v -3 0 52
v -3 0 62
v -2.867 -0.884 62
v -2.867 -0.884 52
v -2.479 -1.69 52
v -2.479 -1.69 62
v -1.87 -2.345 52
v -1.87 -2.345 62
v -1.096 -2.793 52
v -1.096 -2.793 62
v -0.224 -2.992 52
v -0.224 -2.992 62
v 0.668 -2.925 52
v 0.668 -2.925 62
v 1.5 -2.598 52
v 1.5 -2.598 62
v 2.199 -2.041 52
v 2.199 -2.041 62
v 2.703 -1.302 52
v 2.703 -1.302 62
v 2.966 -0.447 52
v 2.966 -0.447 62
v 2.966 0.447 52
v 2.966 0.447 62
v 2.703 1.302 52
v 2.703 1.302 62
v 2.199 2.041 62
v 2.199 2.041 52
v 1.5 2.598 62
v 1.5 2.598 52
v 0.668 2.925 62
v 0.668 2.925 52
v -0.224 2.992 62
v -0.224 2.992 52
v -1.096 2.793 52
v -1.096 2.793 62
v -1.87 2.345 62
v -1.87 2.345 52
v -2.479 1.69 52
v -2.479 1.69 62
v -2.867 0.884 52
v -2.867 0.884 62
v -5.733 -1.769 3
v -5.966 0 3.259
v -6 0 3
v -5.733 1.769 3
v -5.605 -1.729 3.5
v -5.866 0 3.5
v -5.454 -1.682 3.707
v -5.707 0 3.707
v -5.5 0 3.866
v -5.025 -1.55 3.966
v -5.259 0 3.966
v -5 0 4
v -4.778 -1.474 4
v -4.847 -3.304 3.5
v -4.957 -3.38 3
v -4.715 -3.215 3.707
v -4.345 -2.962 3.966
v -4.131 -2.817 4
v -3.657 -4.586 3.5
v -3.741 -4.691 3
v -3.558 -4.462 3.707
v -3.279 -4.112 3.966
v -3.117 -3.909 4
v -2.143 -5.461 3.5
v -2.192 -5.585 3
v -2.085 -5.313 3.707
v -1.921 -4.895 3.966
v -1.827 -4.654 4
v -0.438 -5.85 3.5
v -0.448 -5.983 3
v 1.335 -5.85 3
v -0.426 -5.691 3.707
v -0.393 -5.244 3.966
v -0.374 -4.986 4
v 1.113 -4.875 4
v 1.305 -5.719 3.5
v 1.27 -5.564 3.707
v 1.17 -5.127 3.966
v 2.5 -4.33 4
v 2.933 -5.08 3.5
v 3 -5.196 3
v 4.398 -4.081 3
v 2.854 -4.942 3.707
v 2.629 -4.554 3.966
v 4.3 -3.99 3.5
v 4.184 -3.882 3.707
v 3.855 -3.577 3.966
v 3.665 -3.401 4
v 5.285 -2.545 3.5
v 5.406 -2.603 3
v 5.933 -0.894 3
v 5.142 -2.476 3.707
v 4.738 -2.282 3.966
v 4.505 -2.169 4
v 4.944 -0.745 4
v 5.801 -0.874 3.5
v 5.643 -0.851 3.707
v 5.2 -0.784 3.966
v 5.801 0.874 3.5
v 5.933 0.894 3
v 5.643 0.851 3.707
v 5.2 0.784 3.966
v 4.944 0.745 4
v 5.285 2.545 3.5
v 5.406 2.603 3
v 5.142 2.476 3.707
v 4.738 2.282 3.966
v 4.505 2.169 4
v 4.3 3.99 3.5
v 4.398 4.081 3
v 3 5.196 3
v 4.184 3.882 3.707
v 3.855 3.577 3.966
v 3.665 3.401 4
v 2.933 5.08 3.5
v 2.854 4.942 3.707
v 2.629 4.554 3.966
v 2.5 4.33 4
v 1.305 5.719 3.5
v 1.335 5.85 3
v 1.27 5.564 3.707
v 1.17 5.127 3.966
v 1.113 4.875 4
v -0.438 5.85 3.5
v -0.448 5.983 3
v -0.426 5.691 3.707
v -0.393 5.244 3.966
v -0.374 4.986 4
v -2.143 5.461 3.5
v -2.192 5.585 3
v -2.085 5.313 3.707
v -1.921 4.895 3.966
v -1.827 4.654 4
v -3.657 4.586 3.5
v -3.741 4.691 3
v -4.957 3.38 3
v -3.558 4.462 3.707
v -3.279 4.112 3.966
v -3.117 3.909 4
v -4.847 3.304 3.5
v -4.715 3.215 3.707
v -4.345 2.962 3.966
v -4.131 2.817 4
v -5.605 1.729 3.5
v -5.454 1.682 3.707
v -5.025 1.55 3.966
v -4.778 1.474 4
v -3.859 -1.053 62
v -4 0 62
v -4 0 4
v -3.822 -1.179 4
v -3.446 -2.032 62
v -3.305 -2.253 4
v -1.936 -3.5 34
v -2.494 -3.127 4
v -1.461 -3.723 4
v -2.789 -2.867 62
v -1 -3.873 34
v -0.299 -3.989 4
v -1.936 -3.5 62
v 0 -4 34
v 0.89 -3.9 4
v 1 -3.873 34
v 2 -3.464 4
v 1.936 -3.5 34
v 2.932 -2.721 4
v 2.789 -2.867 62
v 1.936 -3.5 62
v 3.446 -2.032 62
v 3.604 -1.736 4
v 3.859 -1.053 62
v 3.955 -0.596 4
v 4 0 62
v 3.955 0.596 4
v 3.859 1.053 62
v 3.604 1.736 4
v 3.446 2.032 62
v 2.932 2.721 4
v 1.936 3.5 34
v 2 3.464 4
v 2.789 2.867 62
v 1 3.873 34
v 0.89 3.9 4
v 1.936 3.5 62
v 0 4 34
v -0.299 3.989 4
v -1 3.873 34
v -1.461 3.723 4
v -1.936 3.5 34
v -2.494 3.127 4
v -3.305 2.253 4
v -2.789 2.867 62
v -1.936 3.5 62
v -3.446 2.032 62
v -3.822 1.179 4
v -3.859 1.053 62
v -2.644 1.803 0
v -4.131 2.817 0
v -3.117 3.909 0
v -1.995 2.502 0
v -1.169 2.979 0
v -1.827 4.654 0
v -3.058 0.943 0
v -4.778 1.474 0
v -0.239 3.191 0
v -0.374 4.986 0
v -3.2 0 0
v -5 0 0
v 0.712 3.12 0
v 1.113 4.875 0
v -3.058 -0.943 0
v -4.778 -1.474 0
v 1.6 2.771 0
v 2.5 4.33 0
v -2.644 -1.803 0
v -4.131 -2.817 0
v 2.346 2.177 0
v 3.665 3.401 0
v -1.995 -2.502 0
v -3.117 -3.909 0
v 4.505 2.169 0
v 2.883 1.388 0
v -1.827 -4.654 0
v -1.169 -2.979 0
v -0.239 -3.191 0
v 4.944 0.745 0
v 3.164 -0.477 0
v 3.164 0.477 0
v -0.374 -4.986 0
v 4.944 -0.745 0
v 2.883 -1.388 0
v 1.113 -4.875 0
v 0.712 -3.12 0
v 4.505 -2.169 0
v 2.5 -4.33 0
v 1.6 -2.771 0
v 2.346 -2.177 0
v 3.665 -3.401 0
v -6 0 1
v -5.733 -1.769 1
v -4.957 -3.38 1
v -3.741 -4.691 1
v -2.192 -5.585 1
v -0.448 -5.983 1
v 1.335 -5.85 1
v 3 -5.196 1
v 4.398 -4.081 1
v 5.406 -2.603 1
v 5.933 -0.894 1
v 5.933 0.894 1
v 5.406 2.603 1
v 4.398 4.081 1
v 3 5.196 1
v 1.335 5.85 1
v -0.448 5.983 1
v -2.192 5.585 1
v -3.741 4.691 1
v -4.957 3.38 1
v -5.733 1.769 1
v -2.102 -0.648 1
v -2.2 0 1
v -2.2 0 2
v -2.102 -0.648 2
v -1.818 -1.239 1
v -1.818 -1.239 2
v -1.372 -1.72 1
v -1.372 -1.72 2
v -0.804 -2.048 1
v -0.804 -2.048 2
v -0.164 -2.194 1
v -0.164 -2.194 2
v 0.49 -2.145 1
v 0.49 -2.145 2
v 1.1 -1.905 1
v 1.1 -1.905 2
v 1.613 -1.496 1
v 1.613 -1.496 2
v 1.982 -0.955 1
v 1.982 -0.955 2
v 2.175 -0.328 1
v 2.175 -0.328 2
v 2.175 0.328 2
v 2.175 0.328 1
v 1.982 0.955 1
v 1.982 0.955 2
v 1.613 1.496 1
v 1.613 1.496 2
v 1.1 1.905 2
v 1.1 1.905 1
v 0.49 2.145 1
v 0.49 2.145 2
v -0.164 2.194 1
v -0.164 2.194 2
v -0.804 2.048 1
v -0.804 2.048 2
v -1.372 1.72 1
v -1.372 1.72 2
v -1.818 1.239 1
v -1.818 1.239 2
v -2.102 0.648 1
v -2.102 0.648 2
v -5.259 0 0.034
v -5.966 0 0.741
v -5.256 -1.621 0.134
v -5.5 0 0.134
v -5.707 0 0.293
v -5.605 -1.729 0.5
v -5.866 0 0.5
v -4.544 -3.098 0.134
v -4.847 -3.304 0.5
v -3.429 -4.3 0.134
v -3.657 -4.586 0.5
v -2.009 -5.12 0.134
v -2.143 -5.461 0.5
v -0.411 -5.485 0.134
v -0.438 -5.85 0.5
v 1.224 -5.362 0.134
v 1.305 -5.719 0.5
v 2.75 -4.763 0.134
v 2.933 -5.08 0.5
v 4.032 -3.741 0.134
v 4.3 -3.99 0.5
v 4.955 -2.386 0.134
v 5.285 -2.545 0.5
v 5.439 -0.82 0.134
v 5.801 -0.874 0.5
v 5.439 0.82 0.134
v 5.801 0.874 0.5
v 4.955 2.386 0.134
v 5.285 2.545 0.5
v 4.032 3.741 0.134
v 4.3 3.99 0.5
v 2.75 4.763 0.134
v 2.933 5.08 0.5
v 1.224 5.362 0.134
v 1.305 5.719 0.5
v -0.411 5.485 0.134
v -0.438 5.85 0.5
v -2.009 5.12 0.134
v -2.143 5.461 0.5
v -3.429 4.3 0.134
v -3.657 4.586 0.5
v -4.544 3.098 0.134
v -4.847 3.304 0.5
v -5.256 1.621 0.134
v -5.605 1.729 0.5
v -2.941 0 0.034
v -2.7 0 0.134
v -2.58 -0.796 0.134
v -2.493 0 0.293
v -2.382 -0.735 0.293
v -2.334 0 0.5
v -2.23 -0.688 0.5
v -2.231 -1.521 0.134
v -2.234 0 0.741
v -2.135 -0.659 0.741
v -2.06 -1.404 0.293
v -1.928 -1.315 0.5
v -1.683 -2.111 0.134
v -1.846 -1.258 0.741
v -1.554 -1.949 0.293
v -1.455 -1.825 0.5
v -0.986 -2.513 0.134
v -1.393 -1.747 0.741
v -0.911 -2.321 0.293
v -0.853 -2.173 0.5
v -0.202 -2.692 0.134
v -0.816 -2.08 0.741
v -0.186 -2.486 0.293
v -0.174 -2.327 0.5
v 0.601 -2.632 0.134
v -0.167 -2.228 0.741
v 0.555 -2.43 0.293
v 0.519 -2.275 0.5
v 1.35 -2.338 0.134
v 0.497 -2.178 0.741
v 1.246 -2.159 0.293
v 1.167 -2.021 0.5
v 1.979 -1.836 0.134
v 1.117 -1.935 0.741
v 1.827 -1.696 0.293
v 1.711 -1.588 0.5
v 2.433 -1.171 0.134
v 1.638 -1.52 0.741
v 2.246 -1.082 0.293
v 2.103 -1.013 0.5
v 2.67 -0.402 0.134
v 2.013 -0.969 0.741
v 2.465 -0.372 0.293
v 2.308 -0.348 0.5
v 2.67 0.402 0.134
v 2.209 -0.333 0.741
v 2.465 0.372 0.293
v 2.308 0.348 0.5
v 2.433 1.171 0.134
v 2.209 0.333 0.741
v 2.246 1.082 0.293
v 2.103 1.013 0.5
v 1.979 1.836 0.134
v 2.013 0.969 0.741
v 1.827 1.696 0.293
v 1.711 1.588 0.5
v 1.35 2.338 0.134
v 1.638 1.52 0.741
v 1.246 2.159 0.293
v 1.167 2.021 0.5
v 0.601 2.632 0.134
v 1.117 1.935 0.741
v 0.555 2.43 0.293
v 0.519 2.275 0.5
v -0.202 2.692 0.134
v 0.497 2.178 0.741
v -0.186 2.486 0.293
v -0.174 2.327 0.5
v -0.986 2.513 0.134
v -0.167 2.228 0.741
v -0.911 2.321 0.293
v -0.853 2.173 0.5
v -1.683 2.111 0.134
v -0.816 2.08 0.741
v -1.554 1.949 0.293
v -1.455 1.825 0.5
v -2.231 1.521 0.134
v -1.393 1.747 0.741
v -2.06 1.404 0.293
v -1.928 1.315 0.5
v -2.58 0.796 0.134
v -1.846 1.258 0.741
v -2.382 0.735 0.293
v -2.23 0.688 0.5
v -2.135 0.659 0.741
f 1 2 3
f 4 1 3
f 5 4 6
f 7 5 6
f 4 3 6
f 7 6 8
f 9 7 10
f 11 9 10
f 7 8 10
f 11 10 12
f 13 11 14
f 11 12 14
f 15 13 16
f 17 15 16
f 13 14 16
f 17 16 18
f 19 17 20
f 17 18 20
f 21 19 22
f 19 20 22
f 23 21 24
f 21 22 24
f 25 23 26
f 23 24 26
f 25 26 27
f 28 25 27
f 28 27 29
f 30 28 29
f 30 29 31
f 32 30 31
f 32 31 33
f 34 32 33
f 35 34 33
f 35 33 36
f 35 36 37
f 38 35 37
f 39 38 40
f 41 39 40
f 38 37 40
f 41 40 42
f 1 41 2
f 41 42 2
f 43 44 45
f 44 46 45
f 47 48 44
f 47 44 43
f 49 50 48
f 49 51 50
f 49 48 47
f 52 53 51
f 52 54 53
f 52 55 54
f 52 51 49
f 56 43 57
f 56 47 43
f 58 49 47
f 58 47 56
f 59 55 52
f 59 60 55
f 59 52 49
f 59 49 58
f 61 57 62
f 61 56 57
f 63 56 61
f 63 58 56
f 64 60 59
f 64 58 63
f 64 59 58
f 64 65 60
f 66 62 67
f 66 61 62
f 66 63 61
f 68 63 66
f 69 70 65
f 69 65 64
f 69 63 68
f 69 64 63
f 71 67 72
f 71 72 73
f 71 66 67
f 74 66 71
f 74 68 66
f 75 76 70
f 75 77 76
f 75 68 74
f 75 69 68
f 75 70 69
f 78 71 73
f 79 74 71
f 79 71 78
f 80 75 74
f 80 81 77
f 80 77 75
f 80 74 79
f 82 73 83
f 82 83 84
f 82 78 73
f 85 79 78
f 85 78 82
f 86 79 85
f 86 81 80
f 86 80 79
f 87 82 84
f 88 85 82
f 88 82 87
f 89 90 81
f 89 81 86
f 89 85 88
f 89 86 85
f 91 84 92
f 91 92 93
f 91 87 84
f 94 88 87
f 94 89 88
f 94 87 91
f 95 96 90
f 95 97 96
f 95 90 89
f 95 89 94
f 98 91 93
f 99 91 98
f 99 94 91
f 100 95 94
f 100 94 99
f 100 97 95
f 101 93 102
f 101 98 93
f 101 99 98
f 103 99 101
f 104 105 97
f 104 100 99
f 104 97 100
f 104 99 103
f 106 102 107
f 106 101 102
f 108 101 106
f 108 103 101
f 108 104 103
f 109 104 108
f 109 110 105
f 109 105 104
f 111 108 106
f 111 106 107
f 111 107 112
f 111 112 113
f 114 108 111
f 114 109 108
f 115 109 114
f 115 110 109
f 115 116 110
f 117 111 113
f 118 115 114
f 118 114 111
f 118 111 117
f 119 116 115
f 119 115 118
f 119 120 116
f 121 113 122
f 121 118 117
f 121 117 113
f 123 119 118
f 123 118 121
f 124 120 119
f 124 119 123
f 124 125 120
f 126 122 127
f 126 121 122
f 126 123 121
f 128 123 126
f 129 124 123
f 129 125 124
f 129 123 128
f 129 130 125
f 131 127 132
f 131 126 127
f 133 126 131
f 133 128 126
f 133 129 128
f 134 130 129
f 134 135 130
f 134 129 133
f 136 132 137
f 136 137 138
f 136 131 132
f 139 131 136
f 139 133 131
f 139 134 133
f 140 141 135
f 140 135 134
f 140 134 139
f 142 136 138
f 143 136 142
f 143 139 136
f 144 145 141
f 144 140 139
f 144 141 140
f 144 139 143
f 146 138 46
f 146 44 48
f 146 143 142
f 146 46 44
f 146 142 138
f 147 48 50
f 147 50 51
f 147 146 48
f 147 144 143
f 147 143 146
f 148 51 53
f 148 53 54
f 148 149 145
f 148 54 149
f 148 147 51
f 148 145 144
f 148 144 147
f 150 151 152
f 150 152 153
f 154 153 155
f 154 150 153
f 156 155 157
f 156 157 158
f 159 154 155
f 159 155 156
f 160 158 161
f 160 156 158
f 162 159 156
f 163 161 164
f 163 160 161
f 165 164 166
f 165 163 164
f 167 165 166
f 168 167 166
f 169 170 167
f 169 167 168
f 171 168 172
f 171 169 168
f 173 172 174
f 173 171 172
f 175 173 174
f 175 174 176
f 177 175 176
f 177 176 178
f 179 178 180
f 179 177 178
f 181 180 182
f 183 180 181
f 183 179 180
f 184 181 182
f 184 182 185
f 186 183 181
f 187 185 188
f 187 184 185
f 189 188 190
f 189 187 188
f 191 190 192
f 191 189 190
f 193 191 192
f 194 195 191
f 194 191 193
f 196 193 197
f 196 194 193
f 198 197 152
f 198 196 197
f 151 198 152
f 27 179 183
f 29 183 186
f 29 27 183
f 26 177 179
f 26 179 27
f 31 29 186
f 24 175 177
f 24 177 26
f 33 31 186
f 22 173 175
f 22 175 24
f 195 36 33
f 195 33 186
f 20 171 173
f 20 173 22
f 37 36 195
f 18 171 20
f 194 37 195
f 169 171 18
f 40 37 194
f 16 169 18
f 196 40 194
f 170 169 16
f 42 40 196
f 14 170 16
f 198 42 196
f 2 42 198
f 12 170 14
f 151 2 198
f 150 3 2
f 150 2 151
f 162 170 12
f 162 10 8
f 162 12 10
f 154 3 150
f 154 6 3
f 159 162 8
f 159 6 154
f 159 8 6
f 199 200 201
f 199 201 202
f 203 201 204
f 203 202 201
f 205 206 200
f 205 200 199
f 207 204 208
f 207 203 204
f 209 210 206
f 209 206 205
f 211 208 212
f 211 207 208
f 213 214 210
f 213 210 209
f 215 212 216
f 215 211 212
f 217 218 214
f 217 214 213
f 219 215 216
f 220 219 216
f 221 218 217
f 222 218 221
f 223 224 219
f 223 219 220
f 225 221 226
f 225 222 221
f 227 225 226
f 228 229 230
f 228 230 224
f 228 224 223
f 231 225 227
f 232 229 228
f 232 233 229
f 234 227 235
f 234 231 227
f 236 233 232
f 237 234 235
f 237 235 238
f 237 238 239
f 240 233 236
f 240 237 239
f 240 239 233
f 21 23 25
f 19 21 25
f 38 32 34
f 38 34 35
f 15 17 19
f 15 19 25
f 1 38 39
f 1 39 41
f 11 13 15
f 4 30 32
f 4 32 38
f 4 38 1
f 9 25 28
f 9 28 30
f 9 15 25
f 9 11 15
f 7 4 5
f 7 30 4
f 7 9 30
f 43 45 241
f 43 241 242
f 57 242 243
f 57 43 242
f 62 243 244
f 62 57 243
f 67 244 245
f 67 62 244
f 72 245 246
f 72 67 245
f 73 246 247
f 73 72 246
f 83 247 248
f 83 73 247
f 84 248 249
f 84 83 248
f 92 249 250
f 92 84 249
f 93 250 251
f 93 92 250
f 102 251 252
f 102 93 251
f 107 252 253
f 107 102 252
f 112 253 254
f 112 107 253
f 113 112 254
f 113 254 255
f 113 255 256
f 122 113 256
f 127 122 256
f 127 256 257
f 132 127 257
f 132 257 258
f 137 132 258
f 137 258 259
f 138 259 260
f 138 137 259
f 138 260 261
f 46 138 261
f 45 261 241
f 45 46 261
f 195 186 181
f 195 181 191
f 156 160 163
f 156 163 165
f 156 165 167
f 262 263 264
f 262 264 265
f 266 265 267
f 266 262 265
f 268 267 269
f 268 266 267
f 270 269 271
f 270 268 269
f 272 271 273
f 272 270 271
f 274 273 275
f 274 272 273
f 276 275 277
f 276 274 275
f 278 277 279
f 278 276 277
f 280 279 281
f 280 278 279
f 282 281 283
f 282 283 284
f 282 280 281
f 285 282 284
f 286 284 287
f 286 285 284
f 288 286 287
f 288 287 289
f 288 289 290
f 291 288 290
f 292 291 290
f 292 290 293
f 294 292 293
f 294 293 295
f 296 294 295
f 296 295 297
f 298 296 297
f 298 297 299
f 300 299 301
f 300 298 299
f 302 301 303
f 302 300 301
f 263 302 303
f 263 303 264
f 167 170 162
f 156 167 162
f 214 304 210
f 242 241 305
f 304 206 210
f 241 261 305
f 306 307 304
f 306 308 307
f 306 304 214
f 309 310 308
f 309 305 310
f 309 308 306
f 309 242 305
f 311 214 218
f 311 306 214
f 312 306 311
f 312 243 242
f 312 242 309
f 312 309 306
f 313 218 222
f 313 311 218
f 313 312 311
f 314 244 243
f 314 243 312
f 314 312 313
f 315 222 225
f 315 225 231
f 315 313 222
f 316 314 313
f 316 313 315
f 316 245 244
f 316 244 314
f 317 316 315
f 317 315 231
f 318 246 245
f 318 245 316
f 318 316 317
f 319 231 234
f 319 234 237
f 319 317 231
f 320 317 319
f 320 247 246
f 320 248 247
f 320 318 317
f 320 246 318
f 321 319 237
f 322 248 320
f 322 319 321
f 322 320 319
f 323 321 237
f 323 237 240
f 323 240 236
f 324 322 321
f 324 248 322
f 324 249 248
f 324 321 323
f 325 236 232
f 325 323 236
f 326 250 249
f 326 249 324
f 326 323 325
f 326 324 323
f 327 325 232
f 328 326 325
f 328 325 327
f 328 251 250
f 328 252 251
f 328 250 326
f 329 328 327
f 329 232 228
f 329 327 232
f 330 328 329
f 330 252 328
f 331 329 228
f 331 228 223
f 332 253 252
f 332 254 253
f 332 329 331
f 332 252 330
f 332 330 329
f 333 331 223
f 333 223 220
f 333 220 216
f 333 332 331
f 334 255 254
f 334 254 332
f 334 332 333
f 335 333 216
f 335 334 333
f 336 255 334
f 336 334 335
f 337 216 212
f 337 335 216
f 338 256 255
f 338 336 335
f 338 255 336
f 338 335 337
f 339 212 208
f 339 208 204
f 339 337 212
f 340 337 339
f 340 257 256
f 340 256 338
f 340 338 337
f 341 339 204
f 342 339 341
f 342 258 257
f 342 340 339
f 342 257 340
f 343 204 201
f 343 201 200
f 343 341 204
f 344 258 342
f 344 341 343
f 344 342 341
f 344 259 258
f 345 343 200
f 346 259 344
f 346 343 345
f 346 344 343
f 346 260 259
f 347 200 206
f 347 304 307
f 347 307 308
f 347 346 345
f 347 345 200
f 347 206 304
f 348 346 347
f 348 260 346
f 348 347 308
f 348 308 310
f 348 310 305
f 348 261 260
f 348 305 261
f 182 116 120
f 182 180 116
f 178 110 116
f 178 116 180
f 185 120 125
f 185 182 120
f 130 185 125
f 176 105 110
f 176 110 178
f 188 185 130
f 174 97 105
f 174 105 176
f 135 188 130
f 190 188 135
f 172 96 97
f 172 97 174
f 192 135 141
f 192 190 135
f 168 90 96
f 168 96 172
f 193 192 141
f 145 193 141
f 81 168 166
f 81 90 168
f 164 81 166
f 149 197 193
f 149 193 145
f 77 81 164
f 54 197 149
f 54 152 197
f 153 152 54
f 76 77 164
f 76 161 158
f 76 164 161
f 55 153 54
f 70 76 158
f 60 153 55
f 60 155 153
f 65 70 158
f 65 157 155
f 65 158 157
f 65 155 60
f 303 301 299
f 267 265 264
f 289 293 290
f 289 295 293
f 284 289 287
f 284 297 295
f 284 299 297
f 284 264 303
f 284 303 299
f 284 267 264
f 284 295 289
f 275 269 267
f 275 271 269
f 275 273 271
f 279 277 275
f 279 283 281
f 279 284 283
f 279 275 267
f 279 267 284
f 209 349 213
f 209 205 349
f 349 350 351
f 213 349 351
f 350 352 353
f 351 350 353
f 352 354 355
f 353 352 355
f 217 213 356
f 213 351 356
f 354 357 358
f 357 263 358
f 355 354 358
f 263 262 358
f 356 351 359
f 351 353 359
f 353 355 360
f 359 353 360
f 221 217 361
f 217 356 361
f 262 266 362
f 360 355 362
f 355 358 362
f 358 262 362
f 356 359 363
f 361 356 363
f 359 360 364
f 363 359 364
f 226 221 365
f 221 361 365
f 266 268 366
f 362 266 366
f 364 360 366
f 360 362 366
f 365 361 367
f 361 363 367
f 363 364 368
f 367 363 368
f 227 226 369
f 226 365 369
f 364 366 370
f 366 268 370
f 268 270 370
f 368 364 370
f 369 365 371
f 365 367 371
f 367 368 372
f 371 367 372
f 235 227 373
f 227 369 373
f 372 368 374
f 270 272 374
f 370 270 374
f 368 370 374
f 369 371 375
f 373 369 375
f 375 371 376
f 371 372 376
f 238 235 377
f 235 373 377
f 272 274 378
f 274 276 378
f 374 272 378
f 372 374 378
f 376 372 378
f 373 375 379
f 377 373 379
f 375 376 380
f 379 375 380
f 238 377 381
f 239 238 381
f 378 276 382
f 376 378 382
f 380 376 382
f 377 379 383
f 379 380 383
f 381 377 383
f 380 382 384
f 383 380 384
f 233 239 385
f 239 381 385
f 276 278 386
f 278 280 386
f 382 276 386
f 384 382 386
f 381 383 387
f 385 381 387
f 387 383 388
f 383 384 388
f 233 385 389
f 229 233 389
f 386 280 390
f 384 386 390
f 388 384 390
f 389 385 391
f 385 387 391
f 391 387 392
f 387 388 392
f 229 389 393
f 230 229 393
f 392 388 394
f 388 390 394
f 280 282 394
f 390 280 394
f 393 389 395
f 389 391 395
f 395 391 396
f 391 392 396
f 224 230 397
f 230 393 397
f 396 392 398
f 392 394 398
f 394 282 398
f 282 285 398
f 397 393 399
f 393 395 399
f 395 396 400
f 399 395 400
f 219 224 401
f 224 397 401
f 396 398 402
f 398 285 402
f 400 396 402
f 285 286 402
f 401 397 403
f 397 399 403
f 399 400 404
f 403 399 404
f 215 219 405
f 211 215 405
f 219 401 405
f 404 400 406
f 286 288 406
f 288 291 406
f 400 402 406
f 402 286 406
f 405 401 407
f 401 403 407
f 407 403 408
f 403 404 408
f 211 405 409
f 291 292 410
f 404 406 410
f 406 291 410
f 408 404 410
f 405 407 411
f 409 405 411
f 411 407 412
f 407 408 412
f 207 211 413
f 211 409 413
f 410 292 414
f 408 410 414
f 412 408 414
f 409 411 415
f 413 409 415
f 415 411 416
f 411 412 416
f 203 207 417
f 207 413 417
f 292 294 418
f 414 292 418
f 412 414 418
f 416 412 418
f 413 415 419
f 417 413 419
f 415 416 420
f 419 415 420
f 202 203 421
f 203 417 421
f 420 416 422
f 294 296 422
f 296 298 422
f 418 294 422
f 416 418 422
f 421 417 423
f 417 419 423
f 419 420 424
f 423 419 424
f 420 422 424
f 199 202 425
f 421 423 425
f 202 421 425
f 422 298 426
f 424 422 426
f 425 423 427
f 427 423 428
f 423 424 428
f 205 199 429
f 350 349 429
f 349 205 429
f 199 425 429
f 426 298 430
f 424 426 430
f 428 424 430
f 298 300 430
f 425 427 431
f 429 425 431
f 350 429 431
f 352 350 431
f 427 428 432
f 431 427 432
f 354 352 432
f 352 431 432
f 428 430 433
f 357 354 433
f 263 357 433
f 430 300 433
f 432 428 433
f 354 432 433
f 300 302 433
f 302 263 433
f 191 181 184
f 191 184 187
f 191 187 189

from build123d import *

# Parameters (mm, degrees)
SKETCH001_R     = 3
POCKET_DEPTH    = 10
FILLET_R        = 1
FILLET001_R     = 1
SKETCH002_W     = 10
SKETCH002_H     = 5
POCKET001_DEPTH = 28


with BuildPart() as part:
    # Sketch → Revolution (revolve)
    with BuildSketch(Plane.XZ):
        Polygon((-2.2, 0), (-6, 0), (-6, 4), (-4, 4), (-4, 62), (0, 62), (0, 2), (-2.2, 2), align=None)
    revolve(axis=Axis((0, 0, 0), (0, 0, 1)))

    # Sketch001 (on Face5 of Revolution) → Pocket (cut)
    with BuildSketch(Plane(origin=(0, 0, 62), x_dir=(-1, 0, 0), z_dir=(0, 0, 1))):
        Circle(SKETCH001_R)
    extrude(amount=-POCKET_DEPTH, mode=Mode.SUBTRACT)

    # Fillet
    fillet_edges = [part.edges().sort_by_distance(p)[0] for p in [
        (2.2, 0, 0),
        (6, 0, 0),
    ]]
    fillet(fillet_edges, radius=FILLET_R)

    # Fillet001
    fillet001_edges = [part.edges().sort_by_distance(p)[0] for p in [
        (6, 0, 4),
    ]]
    fillet(fillet001_edges, radius=FILLET001_R)

    # Sketch002 (on Face8 of Fillet001) → Pocket001 (cut)
    with BuildSketch(Plane(origin=(0, 0, 62), x_dir=(-1, 0, 0), z_dir=(0, 0, 1))):
        with Locations((0, -6)):
            Rectangle(SKETCH002_W, SKETCH002_H)
        with Locations((0, 6)):
            Rectangle(SKETCH002_W, SKETCH002_H)
    extrude(amount=-POCKET001_DEPTH, mode=Mode.SUBTRACT)


solid = part.part
